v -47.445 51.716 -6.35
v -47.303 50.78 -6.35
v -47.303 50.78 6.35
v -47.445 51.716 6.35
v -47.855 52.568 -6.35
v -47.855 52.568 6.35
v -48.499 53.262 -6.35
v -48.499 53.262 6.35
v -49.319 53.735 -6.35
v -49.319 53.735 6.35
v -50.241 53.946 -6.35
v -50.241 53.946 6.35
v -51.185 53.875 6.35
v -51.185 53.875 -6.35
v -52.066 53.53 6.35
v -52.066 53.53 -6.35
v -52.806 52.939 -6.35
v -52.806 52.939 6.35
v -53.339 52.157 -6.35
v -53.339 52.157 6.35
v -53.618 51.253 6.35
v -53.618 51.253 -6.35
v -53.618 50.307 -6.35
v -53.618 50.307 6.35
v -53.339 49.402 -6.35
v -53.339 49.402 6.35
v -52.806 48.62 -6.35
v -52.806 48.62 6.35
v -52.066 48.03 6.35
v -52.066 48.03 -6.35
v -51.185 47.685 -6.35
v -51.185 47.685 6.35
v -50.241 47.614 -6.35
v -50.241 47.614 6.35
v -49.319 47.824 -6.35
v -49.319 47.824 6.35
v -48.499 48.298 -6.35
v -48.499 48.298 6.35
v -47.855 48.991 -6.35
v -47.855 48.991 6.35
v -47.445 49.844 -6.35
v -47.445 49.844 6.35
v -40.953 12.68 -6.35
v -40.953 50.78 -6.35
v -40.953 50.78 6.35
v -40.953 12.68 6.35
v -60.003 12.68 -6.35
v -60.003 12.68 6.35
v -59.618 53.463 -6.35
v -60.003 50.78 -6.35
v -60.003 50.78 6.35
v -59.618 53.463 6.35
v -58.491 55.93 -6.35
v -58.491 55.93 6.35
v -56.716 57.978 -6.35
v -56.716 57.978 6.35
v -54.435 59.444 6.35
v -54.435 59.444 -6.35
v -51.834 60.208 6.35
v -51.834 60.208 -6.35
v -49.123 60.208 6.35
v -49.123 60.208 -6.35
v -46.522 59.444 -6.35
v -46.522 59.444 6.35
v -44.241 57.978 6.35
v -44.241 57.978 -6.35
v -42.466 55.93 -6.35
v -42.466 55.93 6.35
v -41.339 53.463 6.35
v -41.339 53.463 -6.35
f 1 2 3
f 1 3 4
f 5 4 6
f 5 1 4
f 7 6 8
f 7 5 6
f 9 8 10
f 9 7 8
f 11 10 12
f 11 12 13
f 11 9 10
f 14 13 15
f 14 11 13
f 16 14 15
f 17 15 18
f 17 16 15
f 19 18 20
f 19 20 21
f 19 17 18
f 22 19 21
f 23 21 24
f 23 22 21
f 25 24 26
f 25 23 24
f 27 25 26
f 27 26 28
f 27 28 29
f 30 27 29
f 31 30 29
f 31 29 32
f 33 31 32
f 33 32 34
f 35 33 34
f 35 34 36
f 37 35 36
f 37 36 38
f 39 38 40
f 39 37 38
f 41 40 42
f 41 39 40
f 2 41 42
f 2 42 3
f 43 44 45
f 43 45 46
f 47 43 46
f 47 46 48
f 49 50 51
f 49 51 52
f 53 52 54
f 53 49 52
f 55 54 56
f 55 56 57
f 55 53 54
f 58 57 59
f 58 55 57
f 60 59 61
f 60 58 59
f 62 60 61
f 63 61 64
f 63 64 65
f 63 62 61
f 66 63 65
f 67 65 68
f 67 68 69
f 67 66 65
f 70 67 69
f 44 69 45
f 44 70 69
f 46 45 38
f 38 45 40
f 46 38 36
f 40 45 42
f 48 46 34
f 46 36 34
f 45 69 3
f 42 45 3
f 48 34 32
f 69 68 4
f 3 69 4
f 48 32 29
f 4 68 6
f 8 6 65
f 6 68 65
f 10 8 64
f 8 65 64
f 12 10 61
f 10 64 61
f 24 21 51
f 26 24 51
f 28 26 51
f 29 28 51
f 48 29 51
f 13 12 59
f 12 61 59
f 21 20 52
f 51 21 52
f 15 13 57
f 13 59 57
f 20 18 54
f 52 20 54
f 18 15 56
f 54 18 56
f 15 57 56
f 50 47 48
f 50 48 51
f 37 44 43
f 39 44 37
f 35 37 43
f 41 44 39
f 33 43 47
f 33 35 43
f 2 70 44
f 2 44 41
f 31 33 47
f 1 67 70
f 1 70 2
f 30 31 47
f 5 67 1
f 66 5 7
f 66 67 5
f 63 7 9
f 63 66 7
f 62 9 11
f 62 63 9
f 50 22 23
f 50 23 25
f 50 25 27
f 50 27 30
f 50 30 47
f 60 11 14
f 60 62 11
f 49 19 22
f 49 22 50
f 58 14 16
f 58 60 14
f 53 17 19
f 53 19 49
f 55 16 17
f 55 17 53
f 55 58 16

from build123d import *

# Parameters (mm, degrees)
BOSS_EXTRUDE1_DEPTH      = 6.35
BOSS_EXTRUDE1_DEPTH_BACK = 6.35
SKETCH1_R                = 3.175


with BuildPart() as part:
    # Sketch1 → Boss-Extrude1 (new, two sides: drawn at the far end of the back side and taken through both)
    with BuildSketch(Plane.XY.offset(-BOSS_EXTRUDE1_DEPTH_BACK)):
        with BuildLine():
            Line((-60.003481739, 12.679905588), (-60.003481739, 50.779905588))
            ThreePointArc((-60.003481739, 50.779905588), (-50.478481739, 60.304905588), (-40.953481739, 50.779905588))
            Line((-40.953481739, 50.779905588), (-40.953481739, 12.679905588))
            Line((-40.953481739, 12.679905588), (-60.003481739, 12.679905588))
        make_face()
        with Locations((-50.478481739, 50.779905588)):
            Circle(SKETCH1_R, mode=Mode.SUBTRACT)
    extrude(amount=BOSS_EXTRUDE1_DEPTH + BOSS_EXTRUDE1_DEPTH_BACK)


solid = part.part
